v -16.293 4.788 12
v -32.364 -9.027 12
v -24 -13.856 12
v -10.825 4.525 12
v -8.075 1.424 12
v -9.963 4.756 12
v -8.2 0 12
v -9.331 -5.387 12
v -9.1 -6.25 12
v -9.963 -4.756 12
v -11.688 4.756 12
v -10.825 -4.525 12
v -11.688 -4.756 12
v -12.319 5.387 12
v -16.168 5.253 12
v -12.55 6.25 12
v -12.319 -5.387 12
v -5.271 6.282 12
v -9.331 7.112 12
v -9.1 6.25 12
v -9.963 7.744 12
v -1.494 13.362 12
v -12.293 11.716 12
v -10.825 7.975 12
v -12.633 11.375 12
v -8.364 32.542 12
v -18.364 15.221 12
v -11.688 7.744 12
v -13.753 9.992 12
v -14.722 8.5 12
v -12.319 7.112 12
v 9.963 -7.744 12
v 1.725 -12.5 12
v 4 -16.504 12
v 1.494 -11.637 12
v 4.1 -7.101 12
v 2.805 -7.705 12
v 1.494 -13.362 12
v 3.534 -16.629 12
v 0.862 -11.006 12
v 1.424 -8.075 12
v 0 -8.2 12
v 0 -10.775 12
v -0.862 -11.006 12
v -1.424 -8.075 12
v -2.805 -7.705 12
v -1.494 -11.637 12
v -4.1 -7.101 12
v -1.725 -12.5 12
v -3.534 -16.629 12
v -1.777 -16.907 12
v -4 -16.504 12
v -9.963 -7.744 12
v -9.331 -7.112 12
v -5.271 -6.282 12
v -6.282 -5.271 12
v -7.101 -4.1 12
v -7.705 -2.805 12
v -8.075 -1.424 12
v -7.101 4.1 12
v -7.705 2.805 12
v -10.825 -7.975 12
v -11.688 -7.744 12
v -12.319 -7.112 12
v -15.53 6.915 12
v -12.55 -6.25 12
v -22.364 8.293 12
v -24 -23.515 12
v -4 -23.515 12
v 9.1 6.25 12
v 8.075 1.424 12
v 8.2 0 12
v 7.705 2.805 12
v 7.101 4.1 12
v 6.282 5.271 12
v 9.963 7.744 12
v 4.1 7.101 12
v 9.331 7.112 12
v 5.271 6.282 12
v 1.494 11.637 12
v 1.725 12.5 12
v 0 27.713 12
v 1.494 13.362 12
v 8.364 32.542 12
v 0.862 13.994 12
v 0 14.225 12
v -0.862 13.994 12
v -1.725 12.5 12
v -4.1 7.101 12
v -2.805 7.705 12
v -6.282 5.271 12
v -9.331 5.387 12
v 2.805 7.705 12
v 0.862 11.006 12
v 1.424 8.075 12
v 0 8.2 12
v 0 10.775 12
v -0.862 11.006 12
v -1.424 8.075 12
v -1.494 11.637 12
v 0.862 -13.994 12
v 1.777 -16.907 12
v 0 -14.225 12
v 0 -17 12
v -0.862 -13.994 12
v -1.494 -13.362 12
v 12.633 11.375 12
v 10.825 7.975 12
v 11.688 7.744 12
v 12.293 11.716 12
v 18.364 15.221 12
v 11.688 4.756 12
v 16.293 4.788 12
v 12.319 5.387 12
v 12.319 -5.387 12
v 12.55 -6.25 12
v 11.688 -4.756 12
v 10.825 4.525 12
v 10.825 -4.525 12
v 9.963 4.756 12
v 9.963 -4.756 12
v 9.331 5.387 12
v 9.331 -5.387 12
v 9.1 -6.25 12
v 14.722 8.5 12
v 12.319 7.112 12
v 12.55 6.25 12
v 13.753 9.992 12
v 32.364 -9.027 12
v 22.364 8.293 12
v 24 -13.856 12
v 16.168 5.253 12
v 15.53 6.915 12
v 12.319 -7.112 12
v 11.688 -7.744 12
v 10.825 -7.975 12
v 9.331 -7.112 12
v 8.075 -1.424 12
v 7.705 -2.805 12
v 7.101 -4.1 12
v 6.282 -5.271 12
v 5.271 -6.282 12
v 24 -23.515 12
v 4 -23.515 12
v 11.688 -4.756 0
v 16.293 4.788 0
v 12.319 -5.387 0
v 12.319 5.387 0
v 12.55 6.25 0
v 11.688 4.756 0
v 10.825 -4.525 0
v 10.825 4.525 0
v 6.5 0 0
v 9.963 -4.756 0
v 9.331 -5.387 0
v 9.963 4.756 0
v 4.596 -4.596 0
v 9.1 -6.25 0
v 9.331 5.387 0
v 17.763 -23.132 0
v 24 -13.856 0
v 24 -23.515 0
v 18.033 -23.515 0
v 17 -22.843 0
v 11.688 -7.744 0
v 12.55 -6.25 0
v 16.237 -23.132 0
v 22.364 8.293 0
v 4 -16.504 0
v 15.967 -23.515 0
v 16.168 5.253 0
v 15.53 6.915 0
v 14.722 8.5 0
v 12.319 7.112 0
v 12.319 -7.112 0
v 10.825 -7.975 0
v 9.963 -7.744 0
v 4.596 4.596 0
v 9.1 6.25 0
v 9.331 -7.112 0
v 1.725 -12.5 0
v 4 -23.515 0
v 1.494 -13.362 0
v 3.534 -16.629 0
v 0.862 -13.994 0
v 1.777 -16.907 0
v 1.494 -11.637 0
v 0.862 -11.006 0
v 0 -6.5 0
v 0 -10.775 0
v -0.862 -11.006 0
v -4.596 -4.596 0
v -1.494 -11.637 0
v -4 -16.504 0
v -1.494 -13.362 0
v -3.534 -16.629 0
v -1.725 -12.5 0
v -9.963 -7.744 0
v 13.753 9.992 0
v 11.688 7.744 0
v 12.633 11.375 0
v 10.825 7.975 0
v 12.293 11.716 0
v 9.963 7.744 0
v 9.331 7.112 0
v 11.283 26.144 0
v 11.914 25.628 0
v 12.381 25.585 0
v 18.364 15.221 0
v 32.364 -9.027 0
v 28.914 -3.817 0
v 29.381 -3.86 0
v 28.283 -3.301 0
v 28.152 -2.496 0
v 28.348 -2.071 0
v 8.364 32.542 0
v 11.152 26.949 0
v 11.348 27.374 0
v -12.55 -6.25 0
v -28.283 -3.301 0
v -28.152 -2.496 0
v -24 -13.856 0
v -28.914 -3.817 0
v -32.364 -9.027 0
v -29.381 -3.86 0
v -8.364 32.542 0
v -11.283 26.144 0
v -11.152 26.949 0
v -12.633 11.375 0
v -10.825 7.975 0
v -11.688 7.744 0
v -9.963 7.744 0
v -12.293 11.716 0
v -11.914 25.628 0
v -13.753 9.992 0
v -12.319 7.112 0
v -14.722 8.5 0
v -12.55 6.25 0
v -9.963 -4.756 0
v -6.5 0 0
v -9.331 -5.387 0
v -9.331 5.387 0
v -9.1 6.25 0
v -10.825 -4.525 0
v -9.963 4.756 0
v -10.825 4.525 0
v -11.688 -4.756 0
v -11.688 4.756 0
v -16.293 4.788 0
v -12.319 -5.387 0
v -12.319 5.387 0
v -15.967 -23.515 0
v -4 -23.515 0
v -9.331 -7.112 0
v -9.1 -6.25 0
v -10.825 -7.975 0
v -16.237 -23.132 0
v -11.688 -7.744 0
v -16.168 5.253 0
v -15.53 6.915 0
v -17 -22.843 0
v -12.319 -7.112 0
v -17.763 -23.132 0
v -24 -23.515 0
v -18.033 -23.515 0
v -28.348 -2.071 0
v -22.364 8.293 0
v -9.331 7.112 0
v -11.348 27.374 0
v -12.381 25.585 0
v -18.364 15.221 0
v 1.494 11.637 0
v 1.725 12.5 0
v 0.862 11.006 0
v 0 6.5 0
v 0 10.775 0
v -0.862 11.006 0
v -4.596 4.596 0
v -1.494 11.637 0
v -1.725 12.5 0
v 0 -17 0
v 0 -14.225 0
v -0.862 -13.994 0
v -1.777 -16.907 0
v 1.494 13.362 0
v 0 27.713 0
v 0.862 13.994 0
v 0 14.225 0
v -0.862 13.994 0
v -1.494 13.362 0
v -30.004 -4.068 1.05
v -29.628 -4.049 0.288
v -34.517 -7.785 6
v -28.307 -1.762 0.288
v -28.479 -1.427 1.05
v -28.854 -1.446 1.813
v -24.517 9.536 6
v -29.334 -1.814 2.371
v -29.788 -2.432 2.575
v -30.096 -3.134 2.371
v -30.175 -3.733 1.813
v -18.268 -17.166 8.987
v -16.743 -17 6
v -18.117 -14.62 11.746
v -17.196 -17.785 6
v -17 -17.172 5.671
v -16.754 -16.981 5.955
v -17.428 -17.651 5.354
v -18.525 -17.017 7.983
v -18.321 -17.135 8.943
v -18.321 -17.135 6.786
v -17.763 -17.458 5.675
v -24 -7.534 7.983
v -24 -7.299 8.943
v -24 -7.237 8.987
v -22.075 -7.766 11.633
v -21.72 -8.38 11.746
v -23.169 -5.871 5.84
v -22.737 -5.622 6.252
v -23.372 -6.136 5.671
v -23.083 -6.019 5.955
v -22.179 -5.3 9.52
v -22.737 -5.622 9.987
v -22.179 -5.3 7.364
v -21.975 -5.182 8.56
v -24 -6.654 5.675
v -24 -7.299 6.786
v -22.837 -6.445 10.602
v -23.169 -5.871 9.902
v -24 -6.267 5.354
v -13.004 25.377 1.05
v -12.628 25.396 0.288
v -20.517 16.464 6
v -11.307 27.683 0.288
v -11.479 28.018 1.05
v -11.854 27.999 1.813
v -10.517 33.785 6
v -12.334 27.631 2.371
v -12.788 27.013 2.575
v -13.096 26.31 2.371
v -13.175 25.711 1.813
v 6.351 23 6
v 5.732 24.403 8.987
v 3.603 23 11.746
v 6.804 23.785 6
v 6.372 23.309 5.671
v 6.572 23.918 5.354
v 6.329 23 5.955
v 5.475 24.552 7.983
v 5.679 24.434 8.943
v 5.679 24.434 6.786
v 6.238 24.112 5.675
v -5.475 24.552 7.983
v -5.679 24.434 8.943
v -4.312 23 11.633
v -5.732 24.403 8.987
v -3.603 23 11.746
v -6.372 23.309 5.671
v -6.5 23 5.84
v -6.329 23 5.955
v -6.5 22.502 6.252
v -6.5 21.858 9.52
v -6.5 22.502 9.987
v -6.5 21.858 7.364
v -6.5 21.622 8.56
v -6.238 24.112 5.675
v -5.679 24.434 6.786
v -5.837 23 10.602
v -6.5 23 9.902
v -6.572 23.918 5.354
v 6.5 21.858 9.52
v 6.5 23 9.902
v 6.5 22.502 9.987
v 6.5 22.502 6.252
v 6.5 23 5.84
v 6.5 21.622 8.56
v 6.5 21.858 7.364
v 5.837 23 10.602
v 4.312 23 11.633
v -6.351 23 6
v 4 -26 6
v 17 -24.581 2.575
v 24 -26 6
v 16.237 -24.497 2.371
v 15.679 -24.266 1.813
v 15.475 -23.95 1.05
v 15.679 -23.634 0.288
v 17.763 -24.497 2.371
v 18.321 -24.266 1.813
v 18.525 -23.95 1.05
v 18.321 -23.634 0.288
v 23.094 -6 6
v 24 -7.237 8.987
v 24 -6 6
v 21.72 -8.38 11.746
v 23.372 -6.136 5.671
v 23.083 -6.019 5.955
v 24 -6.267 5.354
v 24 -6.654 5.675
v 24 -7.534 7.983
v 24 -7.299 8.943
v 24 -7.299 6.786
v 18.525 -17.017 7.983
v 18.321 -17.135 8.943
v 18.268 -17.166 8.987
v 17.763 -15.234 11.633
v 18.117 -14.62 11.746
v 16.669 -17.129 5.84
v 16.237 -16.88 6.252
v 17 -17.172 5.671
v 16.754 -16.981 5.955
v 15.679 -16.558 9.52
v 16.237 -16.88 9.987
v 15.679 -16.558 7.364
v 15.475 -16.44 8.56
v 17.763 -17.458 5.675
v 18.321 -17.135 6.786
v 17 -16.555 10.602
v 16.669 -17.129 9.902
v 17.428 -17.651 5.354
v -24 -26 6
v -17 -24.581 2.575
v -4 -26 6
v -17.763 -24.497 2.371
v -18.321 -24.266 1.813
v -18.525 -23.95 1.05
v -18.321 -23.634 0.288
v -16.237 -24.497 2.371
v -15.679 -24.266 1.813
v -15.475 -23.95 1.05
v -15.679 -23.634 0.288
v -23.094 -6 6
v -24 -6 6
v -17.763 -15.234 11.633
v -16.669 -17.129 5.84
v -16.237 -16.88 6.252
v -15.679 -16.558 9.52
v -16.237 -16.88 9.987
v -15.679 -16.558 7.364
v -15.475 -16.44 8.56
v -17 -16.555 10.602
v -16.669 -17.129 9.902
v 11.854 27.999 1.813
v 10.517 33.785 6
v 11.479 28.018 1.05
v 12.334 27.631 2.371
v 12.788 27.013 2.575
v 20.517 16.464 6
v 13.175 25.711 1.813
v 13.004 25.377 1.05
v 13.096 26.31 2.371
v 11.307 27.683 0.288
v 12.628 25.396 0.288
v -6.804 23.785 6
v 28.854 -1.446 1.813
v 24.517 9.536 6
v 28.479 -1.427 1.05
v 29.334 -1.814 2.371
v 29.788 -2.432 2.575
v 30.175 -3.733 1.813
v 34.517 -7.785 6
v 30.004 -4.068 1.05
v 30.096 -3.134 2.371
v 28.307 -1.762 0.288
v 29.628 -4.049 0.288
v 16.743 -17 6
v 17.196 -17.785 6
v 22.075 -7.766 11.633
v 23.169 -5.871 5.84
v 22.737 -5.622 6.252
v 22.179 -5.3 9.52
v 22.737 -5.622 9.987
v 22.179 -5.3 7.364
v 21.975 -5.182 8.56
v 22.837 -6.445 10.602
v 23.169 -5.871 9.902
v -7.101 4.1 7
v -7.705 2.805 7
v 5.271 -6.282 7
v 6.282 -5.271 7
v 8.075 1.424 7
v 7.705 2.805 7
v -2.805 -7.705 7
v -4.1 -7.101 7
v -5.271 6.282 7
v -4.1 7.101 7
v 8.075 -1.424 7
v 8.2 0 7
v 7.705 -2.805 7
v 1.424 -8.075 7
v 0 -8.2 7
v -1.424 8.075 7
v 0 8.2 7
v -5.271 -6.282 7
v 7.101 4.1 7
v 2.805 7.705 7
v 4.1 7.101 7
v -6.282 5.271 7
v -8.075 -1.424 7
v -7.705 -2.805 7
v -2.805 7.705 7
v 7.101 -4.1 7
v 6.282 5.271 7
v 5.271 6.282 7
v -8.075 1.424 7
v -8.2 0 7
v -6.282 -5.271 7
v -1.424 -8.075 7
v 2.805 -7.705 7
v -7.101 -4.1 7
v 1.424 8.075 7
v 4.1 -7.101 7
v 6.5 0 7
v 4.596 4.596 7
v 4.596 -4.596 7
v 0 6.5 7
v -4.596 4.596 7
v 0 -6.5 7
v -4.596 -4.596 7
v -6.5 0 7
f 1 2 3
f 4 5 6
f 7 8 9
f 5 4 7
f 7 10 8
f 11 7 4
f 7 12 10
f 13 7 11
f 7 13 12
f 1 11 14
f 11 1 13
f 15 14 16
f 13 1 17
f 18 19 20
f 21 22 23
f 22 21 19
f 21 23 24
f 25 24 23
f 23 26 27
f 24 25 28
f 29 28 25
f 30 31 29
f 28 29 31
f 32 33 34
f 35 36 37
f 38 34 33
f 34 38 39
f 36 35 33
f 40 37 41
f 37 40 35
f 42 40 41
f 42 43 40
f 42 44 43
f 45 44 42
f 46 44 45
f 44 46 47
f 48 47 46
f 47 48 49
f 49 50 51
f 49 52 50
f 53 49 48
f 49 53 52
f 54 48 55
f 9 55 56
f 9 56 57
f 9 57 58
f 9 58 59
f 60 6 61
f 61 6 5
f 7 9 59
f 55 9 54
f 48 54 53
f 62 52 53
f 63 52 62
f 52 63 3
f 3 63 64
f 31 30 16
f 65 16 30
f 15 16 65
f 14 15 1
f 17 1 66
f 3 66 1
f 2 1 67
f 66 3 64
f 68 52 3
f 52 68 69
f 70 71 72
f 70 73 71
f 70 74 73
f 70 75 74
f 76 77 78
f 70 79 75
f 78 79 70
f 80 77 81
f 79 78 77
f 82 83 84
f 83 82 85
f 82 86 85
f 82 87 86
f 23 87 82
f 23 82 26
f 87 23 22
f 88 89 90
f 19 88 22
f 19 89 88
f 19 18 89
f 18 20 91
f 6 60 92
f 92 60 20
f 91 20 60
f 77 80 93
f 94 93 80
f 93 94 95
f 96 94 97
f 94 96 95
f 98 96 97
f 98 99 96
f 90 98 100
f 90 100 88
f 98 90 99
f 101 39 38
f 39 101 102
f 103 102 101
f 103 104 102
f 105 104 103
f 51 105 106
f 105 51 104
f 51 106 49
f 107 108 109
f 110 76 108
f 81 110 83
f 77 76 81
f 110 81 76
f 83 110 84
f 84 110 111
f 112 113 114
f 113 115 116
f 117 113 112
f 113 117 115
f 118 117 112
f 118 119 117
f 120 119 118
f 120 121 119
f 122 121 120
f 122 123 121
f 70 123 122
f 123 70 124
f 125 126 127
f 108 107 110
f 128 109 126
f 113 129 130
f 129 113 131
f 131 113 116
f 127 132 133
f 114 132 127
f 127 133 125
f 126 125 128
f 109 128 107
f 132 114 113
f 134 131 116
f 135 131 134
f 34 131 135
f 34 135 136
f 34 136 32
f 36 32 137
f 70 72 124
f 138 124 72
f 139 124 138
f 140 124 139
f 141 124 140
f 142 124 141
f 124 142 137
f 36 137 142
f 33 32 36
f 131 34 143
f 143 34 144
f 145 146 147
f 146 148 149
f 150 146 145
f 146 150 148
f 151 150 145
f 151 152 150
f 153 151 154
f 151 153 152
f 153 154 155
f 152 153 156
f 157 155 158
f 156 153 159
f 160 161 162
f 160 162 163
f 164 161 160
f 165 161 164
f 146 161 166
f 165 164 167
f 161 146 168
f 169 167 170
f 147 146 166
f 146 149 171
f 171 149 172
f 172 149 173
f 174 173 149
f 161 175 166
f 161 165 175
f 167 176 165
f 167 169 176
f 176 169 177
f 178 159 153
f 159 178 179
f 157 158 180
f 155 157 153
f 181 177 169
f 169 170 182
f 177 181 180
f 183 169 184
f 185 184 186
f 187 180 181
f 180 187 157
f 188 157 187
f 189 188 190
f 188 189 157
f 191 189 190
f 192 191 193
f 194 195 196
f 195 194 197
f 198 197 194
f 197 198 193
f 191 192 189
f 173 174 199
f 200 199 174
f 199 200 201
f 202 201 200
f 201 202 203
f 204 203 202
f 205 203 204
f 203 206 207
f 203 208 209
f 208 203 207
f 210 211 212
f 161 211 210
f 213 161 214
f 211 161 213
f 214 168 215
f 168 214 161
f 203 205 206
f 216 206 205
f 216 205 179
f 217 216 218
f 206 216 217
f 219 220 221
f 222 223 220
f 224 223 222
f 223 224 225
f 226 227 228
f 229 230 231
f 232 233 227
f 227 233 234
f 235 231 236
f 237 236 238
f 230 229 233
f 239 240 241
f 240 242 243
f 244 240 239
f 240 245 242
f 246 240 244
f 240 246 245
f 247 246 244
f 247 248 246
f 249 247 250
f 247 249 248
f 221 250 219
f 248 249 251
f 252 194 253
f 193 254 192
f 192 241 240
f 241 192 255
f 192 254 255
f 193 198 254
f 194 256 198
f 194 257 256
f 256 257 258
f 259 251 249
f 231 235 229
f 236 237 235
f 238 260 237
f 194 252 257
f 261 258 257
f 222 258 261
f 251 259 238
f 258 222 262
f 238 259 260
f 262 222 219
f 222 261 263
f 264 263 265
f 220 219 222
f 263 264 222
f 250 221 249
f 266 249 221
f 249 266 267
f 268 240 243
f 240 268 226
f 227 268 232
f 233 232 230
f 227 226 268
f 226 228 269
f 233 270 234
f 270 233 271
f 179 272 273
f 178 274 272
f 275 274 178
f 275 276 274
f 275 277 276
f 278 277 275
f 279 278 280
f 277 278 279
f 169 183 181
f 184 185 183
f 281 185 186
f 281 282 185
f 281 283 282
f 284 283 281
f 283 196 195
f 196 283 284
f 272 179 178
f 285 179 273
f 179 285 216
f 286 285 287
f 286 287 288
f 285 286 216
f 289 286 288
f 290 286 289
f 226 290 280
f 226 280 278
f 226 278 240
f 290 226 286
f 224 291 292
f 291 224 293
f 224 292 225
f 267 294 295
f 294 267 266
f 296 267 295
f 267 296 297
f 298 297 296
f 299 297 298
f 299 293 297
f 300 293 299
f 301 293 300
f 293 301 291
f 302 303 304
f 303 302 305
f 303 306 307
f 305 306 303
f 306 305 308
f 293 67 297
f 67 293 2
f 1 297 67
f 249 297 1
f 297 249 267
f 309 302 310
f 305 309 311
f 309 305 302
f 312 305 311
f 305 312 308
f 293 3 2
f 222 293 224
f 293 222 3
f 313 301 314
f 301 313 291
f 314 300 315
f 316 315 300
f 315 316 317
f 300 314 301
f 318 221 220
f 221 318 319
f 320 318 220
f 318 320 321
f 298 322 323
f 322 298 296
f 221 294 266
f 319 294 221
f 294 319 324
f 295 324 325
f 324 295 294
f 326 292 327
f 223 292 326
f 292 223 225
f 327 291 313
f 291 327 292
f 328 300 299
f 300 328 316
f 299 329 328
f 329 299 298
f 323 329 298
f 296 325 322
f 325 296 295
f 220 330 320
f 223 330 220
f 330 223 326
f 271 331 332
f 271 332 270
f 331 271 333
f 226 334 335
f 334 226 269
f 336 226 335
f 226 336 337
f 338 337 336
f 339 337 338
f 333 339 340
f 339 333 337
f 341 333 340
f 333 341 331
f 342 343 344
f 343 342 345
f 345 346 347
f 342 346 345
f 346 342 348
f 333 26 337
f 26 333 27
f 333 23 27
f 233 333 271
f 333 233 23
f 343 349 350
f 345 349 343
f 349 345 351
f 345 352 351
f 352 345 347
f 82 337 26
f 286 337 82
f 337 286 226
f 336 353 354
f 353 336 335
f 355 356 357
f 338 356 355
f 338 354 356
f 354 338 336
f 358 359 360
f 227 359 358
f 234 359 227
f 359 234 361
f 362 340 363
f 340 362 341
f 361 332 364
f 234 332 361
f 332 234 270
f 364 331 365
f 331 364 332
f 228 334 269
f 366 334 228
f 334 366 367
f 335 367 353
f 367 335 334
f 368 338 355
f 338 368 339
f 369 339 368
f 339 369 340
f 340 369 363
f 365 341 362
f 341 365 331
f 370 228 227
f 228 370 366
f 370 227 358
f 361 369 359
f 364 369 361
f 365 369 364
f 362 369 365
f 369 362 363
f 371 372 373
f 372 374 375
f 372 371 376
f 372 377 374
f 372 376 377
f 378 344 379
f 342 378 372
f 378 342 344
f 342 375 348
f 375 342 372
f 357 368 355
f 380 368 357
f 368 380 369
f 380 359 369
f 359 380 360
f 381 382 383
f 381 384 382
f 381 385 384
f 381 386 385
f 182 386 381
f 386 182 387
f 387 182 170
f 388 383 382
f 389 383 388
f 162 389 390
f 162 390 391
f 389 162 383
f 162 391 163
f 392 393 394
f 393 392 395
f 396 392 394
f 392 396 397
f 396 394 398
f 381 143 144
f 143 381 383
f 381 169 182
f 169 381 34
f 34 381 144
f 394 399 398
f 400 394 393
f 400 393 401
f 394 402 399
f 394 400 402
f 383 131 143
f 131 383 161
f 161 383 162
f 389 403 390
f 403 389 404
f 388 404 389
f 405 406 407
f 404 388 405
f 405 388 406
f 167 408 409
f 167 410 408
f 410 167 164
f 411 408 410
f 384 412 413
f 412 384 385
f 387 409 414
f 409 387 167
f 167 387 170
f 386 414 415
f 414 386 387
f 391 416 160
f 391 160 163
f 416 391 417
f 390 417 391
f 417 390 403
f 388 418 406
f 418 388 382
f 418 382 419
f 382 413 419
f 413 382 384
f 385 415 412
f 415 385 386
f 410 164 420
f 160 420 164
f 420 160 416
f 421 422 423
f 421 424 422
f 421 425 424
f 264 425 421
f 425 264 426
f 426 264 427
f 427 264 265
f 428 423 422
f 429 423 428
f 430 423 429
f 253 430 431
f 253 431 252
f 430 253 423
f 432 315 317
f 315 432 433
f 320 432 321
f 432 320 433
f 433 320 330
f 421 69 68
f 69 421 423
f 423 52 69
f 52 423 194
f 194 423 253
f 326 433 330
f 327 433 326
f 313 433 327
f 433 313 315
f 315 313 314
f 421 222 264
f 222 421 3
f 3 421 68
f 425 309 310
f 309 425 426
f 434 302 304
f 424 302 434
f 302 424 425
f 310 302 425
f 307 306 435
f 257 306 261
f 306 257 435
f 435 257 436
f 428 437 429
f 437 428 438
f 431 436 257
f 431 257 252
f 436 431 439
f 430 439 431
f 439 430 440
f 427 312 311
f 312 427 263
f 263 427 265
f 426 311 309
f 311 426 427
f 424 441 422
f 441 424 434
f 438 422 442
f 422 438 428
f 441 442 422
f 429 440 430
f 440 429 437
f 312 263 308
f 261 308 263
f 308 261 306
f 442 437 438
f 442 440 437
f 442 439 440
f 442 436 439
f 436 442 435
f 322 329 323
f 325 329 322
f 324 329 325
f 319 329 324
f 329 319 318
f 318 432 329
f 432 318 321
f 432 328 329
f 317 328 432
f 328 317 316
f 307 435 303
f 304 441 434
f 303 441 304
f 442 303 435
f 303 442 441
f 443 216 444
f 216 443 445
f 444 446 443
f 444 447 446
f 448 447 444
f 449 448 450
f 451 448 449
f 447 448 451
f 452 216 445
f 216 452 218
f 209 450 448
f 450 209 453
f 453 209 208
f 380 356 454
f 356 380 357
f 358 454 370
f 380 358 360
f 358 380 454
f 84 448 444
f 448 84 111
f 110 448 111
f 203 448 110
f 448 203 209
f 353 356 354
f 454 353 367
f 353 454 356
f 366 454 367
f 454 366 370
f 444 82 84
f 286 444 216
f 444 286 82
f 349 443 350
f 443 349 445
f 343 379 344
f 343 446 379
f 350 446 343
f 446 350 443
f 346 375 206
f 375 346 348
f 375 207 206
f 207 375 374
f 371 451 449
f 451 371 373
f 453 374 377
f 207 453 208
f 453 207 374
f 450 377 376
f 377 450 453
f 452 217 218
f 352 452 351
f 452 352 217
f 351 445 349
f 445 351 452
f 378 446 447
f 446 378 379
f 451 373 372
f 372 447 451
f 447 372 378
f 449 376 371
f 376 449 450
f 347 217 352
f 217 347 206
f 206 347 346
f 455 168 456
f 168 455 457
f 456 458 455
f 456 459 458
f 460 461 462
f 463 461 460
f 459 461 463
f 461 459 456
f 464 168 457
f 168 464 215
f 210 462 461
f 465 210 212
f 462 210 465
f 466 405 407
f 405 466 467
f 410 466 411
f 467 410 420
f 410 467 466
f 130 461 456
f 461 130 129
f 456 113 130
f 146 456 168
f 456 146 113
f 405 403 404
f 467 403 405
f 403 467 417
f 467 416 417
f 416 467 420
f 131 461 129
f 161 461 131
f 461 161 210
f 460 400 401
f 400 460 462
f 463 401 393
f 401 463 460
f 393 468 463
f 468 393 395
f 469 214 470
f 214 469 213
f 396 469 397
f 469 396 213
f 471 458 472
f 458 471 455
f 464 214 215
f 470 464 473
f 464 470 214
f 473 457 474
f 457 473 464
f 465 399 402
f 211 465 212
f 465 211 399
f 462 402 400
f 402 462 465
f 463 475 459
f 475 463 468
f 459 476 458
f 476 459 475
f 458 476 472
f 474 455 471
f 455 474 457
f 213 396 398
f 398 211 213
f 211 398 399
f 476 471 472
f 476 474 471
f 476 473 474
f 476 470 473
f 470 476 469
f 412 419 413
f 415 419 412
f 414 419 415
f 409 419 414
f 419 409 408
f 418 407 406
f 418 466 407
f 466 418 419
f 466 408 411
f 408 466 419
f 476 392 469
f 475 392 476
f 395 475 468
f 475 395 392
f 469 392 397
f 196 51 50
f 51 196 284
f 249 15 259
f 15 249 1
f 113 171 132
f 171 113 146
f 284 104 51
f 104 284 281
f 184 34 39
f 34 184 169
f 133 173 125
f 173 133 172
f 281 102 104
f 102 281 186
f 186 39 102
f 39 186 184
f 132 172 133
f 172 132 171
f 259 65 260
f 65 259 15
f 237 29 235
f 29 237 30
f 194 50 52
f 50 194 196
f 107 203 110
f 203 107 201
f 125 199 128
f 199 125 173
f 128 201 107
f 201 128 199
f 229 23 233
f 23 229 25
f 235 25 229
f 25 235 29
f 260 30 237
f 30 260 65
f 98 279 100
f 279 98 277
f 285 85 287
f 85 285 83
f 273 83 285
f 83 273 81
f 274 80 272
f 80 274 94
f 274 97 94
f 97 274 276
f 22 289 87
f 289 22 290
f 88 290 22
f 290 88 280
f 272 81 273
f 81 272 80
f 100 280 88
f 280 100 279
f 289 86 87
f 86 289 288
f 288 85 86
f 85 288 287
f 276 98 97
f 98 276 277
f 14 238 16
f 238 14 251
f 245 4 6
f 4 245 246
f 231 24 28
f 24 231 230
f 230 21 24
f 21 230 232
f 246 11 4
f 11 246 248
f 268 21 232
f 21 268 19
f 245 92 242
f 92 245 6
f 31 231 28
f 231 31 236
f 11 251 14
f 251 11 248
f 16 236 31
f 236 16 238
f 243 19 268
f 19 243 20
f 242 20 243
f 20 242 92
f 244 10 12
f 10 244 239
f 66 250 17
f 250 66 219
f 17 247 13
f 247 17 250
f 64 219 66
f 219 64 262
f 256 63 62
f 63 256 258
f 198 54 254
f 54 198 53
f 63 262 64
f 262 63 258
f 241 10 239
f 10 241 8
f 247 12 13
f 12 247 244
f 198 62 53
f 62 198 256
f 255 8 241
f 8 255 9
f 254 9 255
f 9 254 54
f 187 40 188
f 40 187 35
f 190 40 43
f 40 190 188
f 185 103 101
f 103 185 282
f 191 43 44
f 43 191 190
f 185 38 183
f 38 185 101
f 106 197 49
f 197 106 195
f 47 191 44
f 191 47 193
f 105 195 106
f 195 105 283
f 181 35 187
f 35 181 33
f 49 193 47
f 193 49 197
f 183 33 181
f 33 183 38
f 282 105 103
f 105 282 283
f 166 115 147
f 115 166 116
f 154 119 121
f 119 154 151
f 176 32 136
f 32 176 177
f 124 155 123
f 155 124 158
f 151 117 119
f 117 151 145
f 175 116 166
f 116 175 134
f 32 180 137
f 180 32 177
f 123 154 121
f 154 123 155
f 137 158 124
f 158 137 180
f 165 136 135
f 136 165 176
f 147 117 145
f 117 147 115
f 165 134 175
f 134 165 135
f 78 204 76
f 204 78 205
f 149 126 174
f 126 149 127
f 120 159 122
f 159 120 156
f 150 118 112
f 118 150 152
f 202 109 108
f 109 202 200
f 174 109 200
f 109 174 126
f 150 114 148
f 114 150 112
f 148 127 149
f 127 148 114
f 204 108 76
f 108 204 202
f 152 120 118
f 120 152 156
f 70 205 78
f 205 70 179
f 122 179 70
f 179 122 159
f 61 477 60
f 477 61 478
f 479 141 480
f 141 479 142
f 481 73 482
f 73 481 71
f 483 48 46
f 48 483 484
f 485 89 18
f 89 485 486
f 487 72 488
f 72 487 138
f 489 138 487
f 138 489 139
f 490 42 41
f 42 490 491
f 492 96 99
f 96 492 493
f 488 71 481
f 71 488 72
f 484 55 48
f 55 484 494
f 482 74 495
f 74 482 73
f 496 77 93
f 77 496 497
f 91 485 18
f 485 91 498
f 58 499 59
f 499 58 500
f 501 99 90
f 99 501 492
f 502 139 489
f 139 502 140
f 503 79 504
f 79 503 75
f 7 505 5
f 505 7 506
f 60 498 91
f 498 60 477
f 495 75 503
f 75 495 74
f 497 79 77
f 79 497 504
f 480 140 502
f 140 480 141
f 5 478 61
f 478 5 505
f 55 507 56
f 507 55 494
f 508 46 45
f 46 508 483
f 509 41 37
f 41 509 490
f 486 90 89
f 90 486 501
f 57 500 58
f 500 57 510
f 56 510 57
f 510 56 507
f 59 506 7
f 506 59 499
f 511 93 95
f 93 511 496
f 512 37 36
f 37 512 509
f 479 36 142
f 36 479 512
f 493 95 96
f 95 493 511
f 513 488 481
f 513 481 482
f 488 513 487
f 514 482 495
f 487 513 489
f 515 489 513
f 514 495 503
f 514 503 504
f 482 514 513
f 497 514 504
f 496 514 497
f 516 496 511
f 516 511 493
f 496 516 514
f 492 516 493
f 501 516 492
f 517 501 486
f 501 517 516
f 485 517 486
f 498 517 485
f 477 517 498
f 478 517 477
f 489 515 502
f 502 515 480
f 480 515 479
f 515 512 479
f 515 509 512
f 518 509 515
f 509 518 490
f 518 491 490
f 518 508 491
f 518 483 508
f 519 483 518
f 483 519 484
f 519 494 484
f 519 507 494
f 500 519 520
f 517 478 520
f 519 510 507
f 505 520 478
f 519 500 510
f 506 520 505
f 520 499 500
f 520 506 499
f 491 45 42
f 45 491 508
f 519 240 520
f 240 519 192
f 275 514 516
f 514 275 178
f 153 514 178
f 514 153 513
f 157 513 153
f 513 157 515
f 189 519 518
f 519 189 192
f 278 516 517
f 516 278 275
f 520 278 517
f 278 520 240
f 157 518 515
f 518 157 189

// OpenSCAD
// file: inc/configuration.scad
// Copyright (C) 2012 Joseph Lenox
// HexyDelta 

//==========================================================================//
// Configuration file for HexyDelta OpenSCAD files                          //
// Scroll past the definition section to change basic and advanced settings //
//==========================================================================//

//====================//
// Definition Section //
//====================//

// Print the hole_calibration.scad object to dial in the next 6 settings
// Google found http://www.fairburyfastener.com/xdims_metric_nuts.htm
M8=8.4;// diameter of M8 threaded rod
M5=5.3;// diameter of M5 threaded rod
M3=3.4;// diameter of M3 threaded rod
M2_5=2.7; // diameter of M2.5 threaded rod
M8nut=13;// diameter of M8 nut flat to flat
M5nut=8;// diameter of M5 nut flat to flat
M3nut=5.6;// diameter of M3 nut flat to flat
m3_nut_od = 6.1;

M8nutThickness=6.8;// thickness of a standard M8 nut(nylock is 8mm)
M5nutThickness=4.7;// thickness of a standard M5 nut(nylock is 5mm)
M3nutThickness=2.4;// thickness of a standard M3 nut

// Acme Linear Screw and Nut
ACME14=6.5;// diameter of 1/4 inch ACME threaded rod in mm
ACME14nut=12.8;// diameter of ACME 1/4 inch nut flat to flat in mm
ACME14nutThickness=6.5;// thickness of ACME 1/4 inch nut in mm

//rotary bearings
// format is IDxODxL
xx623=[3, 10, 4];
xx625=[5, 16, 6];
MF204=[4, 10, 4];
MF126=[6, 12, 4];
rotaryBearing=xx623;// for readability(can be changed if other bearings are used

// Increase this if your slicer or printer make holes too tight.
extra_radius = 0.1;

// OD = outside diameter, corner to corner.
m3_nut_od = 6.1;
m3_nut_radius = m3_nut_od/2 + 0.2 + extra_radius;
m3_washer_radius = 3.5 + extra_radius;

// Major diameter of metric 3mm thread.
m3_major = 2.85;
m3_radius = m3_major/2 + extra_radius;
m3_wide_radius = m3_major/2 + extra_radius + 0.2;

// NEMA17 stepper motors.
motor_shaft_diameter = 5;
motor_shaft_radius = motor_shaft_diameter/2 + extra_radius;

// Frame brackets. M3x8mm screws work best with 3.6 mm brackets.
thickness = 3.6;

// OpenBeam or Misumi. Currently only 15x15 mm, but there is a plan
// to make models more parametric and allow 20x20 mm in the future.
extrusion = 15;

// Placement for the NEMA17 stepper motors.
motor_offset = 44;
motor_length = 47;

//=======================//
//  Basic Config Items   //
//=======================//

count=6;
//=======================//
// Advanced Config Items //
//=======================//
$fn=8;		// default resolution for parts, decrease if part compiling or stl/gcode is unmanageable
plate_dia = 25.4*(8.5 + (1.5/12));
inset_hole=3.3+1.5;
inset_hole_r = (plate_dia / 2 ) - inset_hole;
base_thickness=5;
height=40 + base_thickness;
track=[17.4,24.5, height];
track_thickness = 3.1;
center=25;
mounting_screw_dia = 3.4;
plate_length=55;
tolerance=0.2;
wing_length=60;
wing_thickness=7.66;
arm_length=217;
effector_radius=25;
bed_radius=85;
carriage_offset=8.25;
// computed value, the gap to space from the center of the bed such that the 
// angle to the arm at center is ~60degrees

dead_zone=((arm_length * sin(60)) - bed_radius - effector_radius - carriage_offset);
magnetic=true;
// main file
/* Modified from https://github.com/jcrocholl/kossel
License: GPL
*/ 
include <inc/configuration.scad>;

separation = (magnetic ? 40 : track[1] + 10);  // Distance between ball joint mounting faces.
offset = 20;  // Same as DELTA_EFFECTOR_OFFSET in Marlin.
mount_radius = 12.5;  // Hotend mounting screws, standard would be 25mm.
hotend_radius = 8.2;  // Hole for the hotend (J-Head diameter is 16mm).
push_fit_height = 7;  // Length of brass threaded into printed plastic.
height = 12;
cone_r1 = 2.5;
cone_r2 = 14;

module effector() {
    difference() {
        union() {
            cylinder(r=offset-3, h=height, center=true, $fn=60);
            for (a = [60:120:359]) rotate([0, 0, a]) {
                rotate([0, 0, 30]) translate([offset-2, 0, 0])
                    cube([10, 13, height], center=true);
                for (s = [-1, 1]) scale([s, 1, 1]) {
                    translate([0, offset, 0]) 
                        if (magnetic) {
                            difference() {
                                intersection() {
                                    cube([separation+10, 40, height], center=true);
                                    translate([0, -4, 0]) rotate([0, 90, 0])
                                        cylinder(r=10, h=separation+10, center=true);
                                    translate([separation/2-6, 0, 0]) rotate([0, 90, 0])
                                        cylinder(r1=cone_r2, r2=cone_r2, h=20, center=true, $fn=24);
                                }
                                translate([(track[1]+9.5)/2,-1,0]) {
                                    rotate([45, 0, 0])
                                        #cylinder(r=m3_radius, h=separation+1, center=true, $fn=12);
                                }
                            }
                        }
                else {
                    difference() {
                        intersection() {
                            cube([separation, 40, height], center=true);
                            translate([0, -4, 0]) rotate([0, 90, 0])
                                cylinder(r=10, h=separation, center=true);
                            translate([separation/2-7, 0, 0]) rotate([0, 90, 0])
                                cylinder(r1=cone_r2, r2=cone_r1, h=14, center=true, $fn=24);
                        }
                        rotate([0, 90, 0])
                            cylinder(r=m3_radius, h=separation+1, center=true, $fn=12);
                        rotate([90, 0, 90])
                            cylinder(r=m3_nut_radius, h=separation-24, center=true, $fn=6);
                    }
                }
                }
            }
        }
        translate([0, 0, push_fit_height-height/2])
            cylinder(r=hotend_radius, h=height, $fn=36);
        *translate([0, 0, -6]) # import("m5_internal.stl");
        translate([0, 0, -push_fit_height+1]) # cylinder(r=6.5, h=push_fit_height);
        for (a = [0:60:359]) rotate([0, 0, a]) {
            translate([0, mount_radius, 0])
                cylinder(r=m3_wide_radius, h=2*height, center=true, $fn=12);
        }
    }
}

translate([0, 0, height/2]) effector();
